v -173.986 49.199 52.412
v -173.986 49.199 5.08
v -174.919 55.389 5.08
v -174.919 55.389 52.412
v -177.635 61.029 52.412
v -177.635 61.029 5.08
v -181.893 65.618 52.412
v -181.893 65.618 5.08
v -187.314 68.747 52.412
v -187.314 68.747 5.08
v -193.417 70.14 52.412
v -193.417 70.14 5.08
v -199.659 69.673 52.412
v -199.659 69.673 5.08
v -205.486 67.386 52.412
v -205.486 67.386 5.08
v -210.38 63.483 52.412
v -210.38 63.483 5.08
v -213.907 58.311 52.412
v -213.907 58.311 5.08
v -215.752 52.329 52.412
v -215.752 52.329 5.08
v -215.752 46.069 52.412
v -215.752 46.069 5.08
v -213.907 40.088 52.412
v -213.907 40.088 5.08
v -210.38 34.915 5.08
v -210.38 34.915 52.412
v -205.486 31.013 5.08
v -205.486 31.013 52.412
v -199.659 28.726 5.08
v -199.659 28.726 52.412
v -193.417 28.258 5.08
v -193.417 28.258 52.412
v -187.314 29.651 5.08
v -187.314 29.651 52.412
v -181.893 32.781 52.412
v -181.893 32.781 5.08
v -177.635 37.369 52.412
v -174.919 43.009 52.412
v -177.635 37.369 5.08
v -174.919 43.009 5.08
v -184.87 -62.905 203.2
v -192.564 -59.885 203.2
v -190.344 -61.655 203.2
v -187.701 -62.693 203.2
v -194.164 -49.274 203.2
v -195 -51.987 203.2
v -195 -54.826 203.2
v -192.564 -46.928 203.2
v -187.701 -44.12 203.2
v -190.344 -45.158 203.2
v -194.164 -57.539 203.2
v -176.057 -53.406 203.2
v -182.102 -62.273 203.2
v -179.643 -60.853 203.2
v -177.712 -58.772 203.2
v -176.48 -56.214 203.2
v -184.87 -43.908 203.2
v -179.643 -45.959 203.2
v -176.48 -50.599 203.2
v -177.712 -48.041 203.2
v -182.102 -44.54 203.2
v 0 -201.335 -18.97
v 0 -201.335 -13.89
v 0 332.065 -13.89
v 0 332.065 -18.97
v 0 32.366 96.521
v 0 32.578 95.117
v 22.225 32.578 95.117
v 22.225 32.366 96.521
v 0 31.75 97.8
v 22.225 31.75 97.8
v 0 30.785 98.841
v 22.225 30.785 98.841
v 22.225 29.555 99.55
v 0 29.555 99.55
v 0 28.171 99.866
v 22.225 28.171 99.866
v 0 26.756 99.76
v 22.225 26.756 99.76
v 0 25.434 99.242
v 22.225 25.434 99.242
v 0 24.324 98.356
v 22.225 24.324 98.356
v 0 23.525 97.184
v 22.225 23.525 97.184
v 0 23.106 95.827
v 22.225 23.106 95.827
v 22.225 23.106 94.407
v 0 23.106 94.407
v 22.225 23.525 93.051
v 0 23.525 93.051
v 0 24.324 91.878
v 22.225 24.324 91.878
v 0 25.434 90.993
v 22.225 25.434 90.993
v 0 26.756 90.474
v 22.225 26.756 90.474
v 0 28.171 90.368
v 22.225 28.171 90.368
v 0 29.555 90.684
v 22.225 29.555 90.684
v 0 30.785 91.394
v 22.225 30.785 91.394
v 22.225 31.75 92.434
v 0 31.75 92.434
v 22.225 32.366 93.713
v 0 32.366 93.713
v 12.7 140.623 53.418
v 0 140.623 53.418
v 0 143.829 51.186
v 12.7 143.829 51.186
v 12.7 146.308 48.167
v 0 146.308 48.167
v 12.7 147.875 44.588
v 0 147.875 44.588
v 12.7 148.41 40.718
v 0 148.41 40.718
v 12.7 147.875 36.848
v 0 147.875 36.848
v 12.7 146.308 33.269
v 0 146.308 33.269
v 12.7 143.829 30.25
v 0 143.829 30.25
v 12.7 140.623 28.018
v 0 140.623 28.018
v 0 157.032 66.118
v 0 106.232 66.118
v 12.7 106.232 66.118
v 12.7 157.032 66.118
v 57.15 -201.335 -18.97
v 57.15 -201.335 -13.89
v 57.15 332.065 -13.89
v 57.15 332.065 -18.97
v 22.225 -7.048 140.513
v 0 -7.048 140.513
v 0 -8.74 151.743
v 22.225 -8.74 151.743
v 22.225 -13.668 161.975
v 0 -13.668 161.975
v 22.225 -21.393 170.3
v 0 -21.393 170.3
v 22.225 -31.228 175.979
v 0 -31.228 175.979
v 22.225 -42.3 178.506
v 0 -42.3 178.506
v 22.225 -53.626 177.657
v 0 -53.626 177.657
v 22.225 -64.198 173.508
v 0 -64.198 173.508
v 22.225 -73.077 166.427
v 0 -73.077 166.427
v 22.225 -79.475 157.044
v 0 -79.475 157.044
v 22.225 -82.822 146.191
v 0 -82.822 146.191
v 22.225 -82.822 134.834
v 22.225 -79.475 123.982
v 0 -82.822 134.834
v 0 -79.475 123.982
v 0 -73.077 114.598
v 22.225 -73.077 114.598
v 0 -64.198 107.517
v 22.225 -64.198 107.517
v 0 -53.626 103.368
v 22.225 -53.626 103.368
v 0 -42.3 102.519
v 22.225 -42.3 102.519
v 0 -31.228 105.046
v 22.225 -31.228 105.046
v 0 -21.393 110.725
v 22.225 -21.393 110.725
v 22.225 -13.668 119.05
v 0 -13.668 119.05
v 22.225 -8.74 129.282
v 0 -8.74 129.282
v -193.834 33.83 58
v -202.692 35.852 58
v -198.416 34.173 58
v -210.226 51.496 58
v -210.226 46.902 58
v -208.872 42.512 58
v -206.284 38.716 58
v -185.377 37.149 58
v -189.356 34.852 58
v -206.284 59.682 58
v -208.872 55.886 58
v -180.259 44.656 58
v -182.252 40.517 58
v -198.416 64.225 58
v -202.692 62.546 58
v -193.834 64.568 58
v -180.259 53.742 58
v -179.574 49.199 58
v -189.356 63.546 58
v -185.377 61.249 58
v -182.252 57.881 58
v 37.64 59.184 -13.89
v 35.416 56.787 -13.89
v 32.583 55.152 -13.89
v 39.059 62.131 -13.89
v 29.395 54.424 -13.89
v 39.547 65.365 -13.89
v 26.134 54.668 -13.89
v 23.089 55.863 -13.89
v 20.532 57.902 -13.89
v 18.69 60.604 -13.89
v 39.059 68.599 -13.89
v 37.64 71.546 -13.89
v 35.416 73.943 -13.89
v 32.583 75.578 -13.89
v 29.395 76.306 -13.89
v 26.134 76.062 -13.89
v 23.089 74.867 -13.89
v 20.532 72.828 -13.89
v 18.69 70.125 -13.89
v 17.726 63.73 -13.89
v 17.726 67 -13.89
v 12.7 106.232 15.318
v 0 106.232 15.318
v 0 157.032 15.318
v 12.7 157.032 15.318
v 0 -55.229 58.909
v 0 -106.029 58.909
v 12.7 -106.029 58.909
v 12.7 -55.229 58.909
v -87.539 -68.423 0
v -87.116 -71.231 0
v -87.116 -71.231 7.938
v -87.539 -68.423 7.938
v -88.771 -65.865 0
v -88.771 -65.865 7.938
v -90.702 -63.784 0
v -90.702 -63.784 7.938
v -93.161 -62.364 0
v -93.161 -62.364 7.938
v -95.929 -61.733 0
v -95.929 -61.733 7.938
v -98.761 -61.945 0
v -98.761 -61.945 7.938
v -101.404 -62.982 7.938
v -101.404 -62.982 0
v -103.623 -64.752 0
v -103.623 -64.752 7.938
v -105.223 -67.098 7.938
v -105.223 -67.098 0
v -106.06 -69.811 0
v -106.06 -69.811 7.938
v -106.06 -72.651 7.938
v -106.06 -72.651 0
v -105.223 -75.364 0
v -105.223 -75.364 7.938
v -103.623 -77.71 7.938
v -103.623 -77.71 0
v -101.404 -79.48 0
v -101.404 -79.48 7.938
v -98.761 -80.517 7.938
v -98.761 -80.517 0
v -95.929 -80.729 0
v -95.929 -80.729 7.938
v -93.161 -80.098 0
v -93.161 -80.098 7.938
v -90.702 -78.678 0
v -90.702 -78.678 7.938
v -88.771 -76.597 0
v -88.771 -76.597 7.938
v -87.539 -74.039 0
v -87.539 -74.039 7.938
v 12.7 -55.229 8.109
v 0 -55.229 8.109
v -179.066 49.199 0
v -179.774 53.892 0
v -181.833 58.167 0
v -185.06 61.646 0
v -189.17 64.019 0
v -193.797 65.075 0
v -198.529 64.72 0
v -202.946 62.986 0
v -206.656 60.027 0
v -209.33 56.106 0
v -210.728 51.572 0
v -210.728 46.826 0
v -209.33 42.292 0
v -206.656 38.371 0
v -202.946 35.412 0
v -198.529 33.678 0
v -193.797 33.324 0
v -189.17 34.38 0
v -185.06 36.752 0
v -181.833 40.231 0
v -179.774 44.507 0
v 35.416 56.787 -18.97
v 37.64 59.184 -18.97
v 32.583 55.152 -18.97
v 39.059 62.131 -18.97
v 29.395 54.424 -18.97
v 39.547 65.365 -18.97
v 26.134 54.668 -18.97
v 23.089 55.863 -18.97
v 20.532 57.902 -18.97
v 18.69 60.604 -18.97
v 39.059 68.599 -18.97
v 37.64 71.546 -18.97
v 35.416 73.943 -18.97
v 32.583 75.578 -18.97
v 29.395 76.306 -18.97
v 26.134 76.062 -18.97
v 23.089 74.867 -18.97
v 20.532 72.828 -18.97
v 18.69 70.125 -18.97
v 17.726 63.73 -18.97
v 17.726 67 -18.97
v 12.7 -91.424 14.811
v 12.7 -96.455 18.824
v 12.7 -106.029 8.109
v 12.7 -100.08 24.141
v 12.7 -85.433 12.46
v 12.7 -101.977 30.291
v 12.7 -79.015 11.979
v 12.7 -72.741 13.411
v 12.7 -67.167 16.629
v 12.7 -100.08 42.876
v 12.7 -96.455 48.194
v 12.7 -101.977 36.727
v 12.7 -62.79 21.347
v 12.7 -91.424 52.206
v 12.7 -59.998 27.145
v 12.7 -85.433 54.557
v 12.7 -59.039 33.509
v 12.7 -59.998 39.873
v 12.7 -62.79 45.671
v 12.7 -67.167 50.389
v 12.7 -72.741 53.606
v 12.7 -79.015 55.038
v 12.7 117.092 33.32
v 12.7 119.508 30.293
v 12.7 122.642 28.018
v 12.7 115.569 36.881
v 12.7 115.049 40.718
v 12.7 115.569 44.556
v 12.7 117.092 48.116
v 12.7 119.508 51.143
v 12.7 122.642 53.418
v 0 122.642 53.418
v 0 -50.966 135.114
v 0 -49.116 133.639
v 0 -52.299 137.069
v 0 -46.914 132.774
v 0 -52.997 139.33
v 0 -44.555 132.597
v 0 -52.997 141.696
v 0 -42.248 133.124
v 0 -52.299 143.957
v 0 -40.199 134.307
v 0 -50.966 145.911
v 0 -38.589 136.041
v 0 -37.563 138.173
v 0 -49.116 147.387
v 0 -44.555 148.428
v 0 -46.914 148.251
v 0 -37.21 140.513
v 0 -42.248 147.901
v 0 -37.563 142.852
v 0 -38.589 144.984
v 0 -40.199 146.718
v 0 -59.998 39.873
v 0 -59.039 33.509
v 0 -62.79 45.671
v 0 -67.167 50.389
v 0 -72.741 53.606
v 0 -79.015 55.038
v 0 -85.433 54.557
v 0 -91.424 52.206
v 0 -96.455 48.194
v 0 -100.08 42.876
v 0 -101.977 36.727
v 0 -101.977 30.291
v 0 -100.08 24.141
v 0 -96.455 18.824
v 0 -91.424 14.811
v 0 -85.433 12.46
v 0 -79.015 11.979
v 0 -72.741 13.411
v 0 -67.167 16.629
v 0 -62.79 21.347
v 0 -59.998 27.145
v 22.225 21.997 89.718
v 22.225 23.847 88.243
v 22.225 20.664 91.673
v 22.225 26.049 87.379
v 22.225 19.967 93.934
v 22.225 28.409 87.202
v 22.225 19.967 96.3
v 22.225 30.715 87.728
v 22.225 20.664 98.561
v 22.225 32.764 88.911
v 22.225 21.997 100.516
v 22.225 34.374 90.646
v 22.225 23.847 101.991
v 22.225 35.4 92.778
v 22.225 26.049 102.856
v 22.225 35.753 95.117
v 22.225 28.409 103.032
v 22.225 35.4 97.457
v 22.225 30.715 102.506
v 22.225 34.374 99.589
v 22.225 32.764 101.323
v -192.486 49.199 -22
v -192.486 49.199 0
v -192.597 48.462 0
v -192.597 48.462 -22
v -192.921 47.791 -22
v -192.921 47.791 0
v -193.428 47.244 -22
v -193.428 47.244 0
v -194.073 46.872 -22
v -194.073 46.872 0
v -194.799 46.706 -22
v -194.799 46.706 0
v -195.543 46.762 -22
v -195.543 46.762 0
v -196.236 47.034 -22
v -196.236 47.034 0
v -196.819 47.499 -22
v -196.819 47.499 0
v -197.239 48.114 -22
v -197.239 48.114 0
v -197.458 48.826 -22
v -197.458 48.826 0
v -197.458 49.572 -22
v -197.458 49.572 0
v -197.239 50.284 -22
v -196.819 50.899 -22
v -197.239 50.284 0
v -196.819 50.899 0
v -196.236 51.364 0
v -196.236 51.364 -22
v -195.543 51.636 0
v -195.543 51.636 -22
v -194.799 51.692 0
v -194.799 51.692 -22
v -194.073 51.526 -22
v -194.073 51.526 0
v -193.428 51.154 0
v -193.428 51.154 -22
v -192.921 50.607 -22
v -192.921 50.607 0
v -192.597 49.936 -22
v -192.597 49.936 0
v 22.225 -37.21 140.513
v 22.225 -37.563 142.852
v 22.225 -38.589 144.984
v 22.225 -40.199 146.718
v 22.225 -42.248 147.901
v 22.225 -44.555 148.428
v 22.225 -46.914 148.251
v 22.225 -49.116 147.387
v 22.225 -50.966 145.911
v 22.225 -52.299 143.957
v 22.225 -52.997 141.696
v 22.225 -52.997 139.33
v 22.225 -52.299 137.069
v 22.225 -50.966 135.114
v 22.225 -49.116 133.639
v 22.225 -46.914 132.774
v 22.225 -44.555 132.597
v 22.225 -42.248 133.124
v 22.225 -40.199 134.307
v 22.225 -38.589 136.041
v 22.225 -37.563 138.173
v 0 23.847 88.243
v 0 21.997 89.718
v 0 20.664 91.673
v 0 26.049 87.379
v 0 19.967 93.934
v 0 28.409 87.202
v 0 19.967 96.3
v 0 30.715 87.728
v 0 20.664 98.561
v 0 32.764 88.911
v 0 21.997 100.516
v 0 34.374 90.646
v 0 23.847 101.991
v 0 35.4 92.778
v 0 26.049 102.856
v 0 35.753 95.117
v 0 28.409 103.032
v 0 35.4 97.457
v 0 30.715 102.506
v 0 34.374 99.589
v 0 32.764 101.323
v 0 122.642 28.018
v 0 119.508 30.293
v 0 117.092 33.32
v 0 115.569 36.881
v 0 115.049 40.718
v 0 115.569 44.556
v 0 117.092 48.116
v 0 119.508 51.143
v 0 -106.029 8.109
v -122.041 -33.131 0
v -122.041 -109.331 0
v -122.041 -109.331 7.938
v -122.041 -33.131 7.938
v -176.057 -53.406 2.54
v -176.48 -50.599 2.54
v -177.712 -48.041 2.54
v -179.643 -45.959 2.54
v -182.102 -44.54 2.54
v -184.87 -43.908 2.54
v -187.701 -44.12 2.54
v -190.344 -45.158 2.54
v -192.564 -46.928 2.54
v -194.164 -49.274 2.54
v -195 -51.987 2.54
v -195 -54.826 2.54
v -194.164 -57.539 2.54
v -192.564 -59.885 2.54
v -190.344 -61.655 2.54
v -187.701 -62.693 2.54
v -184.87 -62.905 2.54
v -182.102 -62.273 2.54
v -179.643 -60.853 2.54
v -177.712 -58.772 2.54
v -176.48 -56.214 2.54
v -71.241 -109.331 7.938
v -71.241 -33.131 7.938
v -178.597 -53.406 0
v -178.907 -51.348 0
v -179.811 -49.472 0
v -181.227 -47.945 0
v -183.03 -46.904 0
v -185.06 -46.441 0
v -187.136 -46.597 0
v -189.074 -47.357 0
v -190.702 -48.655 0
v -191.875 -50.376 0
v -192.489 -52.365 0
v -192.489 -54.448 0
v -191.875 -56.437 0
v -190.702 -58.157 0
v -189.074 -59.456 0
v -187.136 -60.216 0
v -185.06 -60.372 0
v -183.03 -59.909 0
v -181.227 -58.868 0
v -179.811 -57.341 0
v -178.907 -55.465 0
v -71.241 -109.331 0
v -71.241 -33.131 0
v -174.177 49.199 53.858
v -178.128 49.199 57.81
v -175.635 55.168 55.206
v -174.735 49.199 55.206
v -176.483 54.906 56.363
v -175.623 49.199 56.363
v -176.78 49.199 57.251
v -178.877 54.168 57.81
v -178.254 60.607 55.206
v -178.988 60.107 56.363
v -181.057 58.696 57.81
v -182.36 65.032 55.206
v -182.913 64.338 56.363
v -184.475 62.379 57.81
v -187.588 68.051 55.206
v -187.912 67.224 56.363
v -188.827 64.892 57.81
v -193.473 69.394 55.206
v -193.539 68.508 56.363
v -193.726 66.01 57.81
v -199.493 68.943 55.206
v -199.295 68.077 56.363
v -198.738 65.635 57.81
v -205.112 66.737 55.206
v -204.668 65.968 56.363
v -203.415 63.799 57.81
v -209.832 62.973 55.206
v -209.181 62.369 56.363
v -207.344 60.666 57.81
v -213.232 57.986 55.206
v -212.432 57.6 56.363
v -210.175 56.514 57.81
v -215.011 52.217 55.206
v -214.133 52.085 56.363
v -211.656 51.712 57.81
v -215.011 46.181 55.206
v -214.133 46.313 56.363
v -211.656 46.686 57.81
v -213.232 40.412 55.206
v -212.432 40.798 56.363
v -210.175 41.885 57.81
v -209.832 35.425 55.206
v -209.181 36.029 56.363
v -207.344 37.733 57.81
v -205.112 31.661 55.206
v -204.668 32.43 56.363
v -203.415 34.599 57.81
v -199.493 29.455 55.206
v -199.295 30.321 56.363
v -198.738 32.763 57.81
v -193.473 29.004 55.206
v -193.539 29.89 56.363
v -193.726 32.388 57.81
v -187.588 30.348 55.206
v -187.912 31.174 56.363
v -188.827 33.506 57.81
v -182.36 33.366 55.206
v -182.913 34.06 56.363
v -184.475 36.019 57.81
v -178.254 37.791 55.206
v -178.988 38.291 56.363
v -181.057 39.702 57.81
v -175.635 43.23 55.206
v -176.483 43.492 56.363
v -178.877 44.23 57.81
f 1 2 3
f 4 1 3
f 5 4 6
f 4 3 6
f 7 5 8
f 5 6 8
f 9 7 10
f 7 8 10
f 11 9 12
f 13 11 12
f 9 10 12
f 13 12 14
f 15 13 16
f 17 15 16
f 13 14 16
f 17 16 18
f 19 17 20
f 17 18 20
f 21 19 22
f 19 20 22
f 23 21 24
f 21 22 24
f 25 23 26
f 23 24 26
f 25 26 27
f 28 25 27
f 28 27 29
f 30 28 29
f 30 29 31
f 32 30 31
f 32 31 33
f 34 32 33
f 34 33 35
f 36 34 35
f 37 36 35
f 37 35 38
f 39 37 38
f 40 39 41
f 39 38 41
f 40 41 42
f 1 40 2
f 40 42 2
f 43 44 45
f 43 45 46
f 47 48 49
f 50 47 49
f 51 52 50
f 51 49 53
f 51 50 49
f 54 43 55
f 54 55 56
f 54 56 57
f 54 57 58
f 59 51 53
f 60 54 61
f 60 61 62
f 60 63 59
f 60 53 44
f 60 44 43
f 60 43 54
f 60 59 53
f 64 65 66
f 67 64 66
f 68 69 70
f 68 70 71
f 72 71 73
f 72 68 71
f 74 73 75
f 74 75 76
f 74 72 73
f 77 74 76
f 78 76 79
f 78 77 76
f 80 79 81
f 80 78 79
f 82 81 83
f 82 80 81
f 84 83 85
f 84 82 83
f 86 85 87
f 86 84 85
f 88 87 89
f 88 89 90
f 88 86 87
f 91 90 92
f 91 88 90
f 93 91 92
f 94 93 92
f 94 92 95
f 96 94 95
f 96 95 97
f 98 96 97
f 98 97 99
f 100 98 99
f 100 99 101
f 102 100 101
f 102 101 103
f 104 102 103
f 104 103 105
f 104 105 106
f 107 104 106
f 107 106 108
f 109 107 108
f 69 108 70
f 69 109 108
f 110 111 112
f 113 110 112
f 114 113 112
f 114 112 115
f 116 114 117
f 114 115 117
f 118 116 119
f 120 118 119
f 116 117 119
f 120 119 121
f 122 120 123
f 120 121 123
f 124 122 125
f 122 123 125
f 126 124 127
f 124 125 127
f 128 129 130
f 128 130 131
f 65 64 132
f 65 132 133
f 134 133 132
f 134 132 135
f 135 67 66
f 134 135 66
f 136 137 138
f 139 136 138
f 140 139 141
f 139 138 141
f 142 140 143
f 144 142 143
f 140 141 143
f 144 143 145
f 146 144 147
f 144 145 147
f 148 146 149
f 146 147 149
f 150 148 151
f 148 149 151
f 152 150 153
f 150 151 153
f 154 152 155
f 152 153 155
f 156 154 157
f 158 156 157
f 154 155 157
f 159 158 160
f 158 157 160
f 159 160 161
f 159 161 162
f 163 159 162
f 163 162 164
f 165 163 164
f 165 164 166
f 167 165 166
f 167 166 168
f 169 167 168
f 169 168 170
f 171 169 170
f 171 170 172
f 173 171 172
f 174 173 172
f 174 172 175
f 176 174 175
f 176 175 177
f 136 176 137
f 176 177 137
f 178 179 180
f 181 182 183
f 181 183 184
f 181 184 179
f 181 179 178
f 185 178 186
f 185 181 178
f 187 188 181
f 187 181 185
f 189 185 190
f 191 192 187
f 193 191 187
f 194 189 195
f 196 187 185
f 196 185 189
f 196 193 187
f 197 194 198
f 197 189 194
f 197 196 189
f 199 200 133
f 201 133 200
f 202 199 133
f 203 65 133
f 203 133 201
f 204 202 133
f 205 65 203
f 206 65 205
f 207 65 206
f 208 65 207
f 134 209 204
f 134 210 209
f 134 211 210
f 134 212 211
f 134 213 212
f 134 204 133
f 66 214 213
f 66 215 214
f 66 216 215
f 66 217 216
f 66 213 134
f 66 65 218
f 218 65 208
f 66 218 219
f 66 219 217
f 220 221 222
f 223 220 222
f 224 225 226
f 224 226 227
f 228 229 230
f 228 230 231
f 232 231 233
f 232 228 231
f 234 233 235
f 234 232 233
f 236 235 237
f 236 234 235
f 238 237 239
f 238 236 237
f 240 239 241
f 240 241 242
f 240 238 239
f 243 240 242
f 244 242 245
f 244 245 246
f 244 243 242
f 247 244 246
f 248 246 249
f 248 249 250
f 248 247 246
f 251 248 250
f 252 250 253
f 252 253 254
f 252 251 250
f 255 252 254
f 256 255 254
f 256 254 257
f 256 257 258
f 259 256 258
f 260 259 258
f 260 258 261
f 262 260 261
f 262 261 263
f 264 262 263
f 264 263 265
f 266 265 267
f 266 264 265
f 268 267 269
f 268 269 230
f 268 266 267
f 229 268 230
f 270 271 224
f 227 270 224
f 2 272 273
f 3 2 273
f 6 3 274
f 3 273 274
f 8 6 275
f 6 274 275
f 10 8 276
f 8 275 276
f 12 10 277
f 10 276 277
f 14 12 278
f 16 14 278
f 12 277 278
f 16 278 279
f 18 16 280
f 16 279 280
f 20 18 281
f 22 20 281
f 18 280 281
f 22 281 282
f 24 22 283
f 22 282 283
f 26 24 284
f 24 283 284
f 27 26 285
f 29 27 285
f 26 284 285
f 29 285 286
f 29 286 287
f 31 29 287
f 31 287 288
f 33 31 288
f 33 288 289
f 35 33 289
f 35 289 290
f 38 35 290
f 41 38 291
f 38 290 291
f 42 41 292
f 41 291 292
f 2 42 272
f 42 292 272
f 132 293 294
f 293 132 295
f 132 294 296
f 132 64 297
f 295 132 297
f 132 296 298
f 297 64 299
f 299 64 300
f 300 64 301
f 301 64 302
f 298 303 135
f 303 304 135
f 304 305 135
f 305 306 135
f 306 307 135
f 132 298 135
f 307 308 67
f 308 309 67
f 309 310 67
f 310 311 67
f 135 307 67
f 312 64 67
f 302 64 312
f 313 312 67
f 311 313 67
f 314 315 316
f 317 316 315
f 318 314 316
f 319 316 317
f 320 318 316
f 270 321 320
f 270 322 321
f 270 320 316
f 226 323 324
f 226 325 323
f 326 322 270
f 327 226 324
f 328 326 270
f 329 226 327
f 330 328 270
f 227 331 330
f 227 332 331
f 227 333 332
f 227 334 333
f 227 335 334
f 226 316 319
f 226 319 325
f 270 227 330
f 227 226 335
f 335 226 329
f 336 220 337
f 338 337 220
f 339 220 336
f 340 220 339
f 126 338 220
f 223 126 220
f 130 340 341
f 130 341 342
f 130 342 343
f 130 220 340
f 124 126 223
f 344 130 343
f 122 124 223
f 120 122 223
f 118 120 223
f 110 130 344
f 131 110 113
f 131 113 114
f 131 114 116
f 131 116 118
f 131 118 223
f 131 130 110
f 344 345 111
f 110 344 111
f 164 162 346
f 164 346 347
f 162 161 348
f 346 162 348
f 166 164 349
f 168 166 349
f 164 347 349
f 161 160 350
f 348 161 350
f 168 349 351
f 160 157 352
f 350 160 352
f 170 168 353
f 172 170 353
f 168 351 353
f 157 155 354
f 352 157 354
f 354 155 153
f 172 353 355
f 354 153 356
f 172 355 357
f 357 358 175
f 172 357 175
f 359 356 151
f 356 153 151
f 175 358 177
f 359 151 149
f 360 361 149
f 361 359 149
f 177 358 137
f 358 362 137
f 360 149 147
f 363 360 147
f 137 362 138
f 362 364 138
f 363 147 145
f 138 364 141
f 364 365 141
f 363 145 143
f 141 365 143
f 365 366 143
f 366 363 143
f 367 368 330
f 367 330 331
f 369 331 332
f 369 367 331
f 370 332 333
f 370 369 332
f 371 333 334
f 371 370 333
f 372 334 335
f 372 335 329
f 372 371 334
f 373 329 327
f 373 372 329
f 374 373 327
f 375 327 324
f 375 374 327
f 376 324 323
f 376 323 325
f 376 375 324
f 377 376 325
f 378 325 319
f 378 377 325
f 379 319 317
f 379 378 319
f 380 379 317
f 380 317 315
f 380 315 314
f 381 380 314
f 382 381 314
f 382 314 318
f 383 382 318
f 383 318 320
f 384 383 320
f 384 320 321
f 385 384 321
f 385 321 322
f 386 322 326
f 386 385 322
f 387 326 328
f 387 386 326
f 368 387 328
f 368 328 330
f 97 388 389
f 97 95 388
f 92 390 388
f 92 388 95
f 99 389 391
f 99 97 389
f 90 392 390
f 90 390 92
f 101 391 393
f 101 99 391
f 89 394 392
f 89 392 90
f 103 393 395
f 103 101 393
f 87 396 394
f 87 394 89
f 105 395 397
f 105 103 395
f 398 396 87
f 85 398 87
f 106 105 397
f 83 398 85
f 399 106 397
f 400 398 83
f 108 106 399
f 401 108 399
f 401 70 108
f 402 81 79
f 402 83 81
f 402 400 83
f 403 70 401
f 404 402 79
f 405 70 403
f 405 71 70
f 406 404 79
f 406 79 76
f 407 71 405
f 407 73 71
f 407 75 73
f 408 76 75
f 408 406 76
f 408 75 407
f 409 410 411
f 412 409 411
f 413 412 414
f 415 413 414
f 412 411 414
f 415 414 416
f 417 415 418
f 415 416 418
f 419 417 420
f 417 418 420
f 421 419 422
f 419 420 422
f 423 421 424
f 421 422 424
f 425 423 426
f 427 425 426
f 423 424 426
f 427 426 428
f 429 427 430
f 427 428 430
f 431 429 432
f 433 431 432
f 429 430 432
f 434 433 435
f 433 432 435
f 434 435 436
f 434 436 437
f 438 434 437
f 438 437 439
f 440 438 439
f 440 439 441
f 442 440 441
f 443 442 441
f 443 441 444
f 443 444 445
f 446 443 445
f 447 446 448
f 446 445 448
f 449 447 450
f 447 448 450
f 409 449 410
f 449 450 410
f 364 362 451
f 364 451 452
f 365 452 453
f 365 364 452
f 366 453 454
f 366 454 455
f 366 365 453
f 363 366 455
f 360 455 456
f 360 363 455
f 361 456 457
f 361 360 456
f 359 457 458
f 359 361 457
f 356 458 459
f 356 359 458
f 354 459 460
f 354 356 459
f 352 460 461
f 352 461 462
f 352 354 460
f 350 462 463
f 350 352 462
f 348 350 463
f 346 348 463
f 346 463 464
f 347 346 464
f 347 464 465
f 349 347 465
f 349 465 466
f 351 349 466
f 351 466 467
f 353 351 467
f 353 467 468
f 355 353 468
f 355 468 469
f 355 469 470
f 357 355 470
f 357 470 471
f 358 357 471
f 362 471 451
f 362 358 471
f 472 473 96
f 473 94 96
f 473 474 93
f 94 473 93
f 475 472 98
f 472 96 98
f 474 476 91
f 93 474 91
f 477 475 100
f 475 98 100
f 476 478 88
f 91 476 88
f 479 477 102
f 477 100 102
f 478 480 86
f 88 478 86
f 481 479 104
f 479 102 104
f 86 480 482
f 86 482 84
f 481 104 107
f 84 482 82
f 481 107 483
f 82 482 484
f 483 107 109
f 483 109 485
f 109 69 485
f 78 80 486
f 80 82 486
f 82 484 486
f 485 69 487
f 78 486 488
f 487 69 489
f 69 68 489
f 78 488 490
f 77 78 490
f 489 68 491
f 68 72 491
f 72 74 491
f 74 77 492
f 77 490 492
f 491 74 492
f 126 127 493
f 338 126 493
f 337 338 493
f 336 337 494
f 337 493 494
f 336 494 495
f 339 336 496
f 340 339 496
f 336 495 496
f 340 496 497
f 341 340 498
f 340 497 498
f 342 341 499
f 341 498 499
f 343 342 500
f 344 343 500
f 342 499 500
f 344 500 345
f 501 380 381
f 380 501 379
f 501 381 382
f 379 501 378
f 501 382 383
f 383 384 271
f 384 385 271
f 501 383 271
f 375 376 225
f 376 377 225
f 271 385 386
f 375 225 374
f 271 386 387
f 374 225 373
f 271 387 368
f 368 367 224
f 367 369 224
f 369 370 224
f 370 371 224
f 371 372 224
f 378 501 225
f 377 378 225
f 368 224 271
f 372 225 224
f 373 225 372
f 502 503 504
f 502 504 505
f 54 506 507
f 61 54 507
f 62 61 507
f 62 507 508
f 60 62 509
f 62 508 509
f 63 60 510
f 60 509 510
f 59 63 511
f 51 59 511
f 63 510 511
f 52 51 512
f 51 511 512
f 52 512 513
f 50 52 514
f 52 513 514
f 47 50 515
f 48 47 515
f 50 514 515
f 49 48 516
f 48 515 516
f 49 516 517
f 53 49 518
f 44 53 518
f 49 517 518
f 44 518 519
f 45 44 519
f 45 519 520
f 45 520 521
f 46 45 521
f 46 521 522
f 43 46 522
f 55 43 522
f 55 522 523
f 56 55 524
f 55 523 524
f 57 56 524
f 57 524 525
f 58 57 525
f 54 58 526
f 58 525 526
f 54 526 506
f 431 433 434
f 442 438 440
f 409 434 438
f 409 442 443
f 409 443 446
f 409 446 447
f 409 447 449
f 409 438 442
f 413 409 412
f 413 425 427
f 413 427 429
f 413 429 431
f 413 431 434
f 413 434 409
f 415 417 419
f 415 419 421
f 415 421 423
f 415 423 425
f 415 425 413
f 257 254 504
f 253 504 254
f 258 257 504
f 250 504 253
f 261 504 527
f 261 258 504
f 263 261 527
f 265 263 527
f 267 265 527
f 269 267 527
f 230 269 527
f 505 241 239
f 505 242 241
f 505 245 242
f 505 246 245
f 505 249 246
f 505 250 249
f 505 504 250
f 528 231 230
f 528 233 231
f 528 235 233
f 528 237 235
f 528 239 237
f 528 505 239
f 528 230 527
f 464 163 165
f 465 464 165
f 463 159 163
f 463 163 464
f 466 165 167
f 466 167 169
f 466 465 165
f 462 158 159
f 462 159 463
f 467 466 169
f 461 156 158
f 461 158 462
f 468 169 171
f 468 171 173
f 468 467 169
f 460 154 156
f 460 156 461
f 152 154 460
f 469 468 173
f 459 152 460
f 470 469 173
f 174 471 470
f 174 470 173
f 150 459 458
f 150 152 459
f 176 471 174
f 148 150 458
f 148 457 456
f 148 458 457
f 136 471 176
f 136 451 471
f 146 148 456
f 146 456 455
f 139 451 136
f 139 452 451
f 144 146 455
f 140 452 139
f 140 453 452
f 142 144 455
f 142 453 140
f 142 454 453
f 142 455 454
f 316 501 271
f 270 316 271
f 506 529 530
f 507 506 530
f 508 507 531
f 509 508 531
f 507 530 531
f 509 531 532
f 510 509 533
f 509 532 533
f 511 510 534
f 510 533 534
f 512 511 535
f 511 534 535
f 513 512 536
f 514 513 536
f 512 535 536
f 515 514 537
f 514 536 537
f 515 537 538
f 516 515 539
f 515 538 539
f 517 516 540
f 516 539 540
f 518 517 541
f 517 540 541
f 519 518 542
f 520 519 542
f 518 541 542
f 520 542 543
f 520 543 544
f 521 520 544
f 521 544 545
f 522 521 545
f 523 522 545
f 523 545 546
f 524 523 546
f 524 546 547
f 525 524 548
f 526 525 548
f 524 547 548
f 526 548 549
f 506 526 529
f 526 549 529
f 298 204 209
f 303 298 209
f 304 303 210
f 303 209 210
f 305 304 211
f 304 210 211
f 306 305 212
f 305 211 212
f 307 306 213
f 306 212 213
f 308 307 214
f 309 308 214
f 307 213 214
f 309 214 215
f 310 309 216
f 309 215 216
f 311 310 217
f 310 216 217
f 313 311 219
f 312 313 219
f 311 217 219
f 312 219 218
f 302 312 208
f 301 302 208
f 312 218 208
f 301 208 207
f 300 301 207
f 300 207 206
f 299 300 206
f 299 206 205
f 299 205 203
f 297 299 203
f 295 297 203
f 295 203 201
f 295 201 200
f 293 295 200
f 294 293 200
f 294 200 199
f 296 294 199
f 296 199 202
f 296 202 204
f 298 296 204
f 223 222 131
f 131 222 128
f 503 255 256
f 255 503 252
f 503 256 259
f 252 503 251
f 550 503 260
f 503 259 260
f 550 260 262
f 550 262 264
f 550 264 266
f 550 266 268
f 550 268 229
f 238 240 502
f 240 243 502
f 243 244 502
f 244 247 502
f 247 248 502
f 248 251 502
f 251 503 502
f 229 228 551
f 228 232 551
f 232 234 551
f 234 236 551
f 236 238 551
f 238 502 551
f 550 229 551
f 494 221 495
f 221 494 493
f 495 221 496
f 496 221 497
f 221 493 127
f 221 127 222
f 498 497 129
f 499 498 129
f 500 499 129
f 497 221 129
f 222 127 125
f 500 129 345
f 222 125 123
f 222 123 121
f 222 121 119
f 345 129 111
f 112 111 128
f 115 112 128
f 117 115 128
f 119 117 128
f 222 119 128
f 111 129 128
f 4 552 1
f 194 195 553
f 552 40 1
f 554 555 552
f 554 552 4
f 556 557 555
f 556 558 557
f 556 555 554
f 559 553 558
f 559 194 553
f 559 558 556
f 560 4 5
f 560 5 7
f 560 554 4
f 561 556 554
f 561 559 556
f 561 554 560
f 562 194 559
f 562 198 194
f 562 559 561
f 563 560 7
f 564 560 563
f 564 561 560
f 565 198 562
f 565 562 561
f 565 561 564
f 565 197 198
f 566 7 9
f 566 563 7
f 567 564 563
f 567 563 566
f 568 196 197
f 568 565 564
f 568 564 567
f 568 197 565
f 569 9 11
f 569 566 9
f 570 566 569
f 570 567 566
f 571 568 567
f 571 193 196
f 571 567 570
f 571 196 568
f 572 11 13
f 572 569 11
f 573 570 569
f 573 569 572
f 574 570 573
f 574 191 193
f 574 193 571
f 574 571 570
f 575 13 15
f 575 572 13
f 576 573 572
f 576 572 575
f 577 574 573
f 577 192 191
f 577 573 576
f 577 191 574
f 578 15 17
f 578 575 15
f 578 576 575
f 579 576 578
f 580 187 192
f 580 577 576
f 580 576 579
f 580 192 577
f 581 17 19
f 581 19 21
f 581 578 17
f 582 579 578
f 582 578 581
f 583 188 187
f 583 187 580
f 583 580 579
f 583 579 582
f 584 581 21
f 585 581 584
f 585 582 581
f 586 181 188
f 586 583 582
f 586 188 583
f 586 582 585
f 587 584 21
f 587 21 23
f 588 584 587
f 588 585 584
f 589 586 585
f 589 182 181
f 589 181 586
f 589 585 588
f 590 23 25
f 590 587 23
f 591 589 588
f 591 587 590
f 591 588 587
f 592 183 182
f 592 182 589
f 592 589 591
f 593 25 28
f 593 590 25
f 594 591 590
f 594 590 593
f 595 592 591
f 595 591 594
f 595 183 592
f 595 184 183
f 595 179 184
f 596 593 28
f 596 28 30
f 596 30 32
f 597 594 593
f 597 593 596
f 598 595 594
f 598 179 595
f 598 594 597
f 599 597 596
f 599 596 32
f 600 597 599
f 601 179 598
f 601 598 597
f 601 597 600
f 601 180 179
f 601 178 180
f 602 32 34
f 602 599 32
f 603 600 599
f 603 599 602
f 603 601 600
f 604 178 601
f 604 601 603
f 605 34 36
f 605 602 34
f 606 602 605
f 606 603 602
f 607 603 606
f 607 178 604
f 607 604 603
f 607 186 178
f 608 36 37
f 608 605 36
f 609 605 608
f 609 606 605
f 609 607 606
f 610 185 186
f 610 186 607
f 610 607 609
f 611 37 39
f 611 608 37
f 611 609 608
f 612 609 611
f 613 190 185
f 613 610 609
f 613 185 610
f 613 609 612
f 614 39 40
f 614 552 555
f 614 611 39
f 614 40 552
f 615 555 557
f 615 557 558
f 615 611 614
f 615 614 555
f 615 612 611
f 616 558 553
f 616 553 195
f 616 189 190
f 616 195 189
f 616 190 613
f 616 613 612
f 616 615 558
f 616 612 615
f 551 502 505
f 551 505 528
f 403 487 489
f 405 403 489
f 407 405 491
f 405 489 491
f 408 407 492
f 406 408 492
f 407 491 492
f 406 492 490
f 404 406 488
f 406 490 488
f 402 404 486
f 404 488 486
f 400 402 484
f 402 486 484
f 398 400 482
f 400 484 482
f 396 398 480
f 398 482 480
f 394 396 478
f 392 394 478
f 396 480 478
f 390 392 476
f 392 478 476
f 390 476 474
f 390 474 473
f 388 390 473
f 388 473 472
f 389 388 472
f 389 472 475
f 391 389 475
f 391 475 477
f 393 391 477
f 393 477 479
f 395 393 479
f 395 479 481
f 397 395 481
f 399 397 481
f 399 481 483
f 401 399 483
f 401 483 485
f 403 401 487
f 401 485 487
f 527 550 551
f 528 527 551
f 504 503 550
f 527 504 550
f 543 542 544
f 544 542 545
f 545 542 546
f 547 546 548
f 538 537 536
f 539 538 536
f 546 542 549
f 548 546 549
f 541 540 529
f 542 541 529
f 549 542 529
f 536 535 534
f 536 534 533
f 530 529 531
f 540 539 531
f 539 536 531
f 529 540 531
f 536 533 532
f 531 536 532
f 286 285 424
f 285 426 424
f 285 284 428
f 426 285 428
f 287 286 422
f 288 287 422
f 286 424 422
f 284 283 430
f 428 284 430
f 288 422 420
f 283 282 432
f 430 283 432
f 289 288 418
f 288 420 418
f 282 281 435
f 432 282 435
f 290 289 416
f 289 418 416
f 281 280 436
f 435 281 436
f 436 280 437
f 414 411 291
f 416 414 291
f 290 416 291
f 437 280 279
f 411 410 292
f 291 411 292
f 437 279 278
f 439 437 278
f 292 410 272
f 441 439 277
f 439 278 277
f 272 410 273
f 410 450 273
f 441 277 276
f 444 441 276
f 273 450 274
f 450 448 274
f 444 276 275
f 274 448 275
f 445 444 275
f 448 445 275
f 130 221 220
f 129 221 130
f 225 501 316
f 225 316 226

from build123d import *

# Parameters (mm, degrees)
F0_W      = 533.4
F0_H      = 5.08
F1_DEPTH  = 57.15
F2_R      = 25
F3_DEPTH  = 55
F4_SIZE   = 5.08
F5_R      = 3
F6_DEPTH  = 19.05
F7_R      = 7.9375
F7_R_2    = 4.7625
F8_DEPTH  = 22.225
F9_R      = 38.1
F9_R_2    = 7.9375
F10_DEPTH = 22.225
F11_R     = 10.9718927616
F12_DEPTH = 25.4
F14_R     = 21
F15_DEPTH = 58
F16_SIZE  = 5.08
F17_R     = 5.588
F18_R     = 2.5
F19_DEPTH = 22
F20_W     = 50.8
F20_H     = 50.8
F20_R     = 21.59
F21_DEPTH = 12.7
F22_W     = 50.8
F22_H     = 50.8
F23_DEPTH = 12.7
F24_W     = 50.8
F24_H     = 76.2
F24_R     = 9.525
F25_DEPTH = 7.9375
F26_R     = 9.525
F27_DEPTH = 203.2
F28_SIZE  = 2.54


# Not quite as in the source:
# - a length typed as a fraction of an inch, garbled in the dataset ("3 / 203.2 mm" for 3/8 in), is restored


with BuildPart() as f1:
    # F0 (on Right) → F1 (new body)
    with BuildSketch(Plane.YZ):
        with Locations((65.3649564266, -16.4303069627)):
            Rectangle(F0_W, F0_H)
    extrude(amount=F1_DEPTH)

    # F11 (on face) → F12 (cut)
    with BuildSketch(Plane.XY.offset(-13.8903069627)):
        with Locations((28.575, 65.3649564266)):
            Circle(F11_R)
    extrude(amount=-F12_DEPTH, mode=Mode.SUBTRACT)


with BuildPart() as f3:
    # F2 (on Top) → F3 (new body)
    with BuildSketch(Plane.XY):
        with Locations((-105.339050293, -53.4889884293)):
            Circle(F2_R)
    extrude(amount=F3_DEPTH)

    # F4
    f4_edges = [f3.edges().sort_by_distance(p)[0] for p in [
        (-130.33905, -53.488988, 55),
    ]]
    chamfer(f4_edges, length=F4_SIZE)

    # F5 (on face) → F6 (join)
    with BuildSketch(Plane(origin=(0, 0, 0), x_dir=(1, 0, 0), z_dir=(0, 0, -1))):
        with Locations((-105.339050293, 53.4889884293)):
            Circle(F5_R)
    extrude(amount=F6_DEPTH)


with BuildPart() as f8:
    # F7 (on Right) → F8 (new body)
    with BuildSketch(Plane.YZ):
        with Locations((27.8154350817, 95.117174089)):
            Circle(F7_R)
        with Locations((27.8154350817, 95.117174089)):
            Circle(F7_R_2, mode=Mode.SUBTRACT)
    extrude(amount=F8_DEPTH)


with BuildPart() as f10:
    # F9 (on Right) → F10 (new body)
    with BuildSketch(Plane.YZ):
        with Locations((-45.1477132738, 140.5126005411)):
            Circle(F9_R)
        with Locations((-45.1477132738, 140.5126005411)):
            Circle(F9_R_2, mode=Mode.SUBTRACT)
    extrude(amount=F10_DEPTH)


with BuildPart() as f15:
    # F14 (on Top) → F15 (new body)
    with BuildSketch(Plane.XY):
        with Locations((-194.9862390757, 49.1990633309)):
            Circle(F14_R)
    extrude(amount=F15_DEPTH)

    # F16
    f16_edges = [f15.edges().sort_by_distance(p)[0] for p in [
        (-215.986239, 49.199063, 0),
    ]]
    chamfer(f16_edges, length=F16_SIZE)

    # F17
    f17_edges = [f15.edges().sort_by_distance(p)[0] for p in [
        (-215.986239, 49.199063, 58),
    ]]
    fillet(f17_edges, radius=F17_R)

    # F18 (on face) → F19 (join)
    with BuildSketch(Plane(origin=(0, 0, 0), x_dir=(1, 0, 0), z_dir=(0, 0, -1))):
        with Locations((-194.9862390757, -49.1990633309)):
            Circle(F18_R)
    extrude(amount=F19_DEPTH)


with BuildPart() as f21:
    # F20 (on Right) → F21 (new body)
    with BuildSketch(Plane.YZ):
        with Locations((-80.6285493731, 33.508805865)):
            Rectangle(F20_W, F20_H)
        with Locations((-80.6285493731, 33.508805865)):
            Circle(F20_R, mode=Mode.SUBTRACT)
    extrude(amount=F21_DEPTH)


with BuildPart() as f23:
    # F22 (on Right) → F23 (new body)
    with BuildSketch(Plane.YZ):
        with Locations((131.6323596907, 40.7181175649)):
            Rectangle(F22_W, F22_H)
        with BuildLine():
            Line((122.6420296907, 53.4181175649), (140.6226896907, 53.4181175649))
            ThreePointArc((140.6226896907, 53.4181175649), (148.4102478202, 40.7181175649), (140.6226896907, 28.0181175649))
            Line((140.6226896907, 28.0181175649), (122.6420296907, 28.0181175649))
            ThreePointArc((122.6420296907, 28.0181175649), (115.0493723243, 40.7181175649), (122.6420296907, 53.4181175649))
        make_face(mode=Mode.SUBTRACT)
    extrude(amount=F23_DEPTH)


with BuildPart() as f25:
    # F24 (on Top) → F25 (new body)
    with BuildSketch(Plane.XY):
        with Locations((-96.6411658287, -71.230996871)):
            Rectangle(F24_W, F24_H)
        with Locations((-96.6411658287, -71.230996871)):
            Circle(F24_R, mode=Mode.SUBTRACT)
    extrude(amount=F25_DEPTH)


with BuildPart() as f27:
    # F26 (on Top) → F27 (new body)
    with BuildSketch(Plane.XY):
        with Locations((-185.5818331242, -53.4064434469)):
            Circle(F26_R)
    extrude(amount=F27_DEPTH)

    # F28
    f28_edges = [f27.edges().sort_by_distance(p)[0] for p in [
        (-195.106833, -53.406443, 0),
    ]]
    chamfer(f28_edges, length=F28_SIZE)


solid = Compound([f1.part, f8.part, f10.part, f15.part, f21.part, f23.part, f25.part, f27.part])
